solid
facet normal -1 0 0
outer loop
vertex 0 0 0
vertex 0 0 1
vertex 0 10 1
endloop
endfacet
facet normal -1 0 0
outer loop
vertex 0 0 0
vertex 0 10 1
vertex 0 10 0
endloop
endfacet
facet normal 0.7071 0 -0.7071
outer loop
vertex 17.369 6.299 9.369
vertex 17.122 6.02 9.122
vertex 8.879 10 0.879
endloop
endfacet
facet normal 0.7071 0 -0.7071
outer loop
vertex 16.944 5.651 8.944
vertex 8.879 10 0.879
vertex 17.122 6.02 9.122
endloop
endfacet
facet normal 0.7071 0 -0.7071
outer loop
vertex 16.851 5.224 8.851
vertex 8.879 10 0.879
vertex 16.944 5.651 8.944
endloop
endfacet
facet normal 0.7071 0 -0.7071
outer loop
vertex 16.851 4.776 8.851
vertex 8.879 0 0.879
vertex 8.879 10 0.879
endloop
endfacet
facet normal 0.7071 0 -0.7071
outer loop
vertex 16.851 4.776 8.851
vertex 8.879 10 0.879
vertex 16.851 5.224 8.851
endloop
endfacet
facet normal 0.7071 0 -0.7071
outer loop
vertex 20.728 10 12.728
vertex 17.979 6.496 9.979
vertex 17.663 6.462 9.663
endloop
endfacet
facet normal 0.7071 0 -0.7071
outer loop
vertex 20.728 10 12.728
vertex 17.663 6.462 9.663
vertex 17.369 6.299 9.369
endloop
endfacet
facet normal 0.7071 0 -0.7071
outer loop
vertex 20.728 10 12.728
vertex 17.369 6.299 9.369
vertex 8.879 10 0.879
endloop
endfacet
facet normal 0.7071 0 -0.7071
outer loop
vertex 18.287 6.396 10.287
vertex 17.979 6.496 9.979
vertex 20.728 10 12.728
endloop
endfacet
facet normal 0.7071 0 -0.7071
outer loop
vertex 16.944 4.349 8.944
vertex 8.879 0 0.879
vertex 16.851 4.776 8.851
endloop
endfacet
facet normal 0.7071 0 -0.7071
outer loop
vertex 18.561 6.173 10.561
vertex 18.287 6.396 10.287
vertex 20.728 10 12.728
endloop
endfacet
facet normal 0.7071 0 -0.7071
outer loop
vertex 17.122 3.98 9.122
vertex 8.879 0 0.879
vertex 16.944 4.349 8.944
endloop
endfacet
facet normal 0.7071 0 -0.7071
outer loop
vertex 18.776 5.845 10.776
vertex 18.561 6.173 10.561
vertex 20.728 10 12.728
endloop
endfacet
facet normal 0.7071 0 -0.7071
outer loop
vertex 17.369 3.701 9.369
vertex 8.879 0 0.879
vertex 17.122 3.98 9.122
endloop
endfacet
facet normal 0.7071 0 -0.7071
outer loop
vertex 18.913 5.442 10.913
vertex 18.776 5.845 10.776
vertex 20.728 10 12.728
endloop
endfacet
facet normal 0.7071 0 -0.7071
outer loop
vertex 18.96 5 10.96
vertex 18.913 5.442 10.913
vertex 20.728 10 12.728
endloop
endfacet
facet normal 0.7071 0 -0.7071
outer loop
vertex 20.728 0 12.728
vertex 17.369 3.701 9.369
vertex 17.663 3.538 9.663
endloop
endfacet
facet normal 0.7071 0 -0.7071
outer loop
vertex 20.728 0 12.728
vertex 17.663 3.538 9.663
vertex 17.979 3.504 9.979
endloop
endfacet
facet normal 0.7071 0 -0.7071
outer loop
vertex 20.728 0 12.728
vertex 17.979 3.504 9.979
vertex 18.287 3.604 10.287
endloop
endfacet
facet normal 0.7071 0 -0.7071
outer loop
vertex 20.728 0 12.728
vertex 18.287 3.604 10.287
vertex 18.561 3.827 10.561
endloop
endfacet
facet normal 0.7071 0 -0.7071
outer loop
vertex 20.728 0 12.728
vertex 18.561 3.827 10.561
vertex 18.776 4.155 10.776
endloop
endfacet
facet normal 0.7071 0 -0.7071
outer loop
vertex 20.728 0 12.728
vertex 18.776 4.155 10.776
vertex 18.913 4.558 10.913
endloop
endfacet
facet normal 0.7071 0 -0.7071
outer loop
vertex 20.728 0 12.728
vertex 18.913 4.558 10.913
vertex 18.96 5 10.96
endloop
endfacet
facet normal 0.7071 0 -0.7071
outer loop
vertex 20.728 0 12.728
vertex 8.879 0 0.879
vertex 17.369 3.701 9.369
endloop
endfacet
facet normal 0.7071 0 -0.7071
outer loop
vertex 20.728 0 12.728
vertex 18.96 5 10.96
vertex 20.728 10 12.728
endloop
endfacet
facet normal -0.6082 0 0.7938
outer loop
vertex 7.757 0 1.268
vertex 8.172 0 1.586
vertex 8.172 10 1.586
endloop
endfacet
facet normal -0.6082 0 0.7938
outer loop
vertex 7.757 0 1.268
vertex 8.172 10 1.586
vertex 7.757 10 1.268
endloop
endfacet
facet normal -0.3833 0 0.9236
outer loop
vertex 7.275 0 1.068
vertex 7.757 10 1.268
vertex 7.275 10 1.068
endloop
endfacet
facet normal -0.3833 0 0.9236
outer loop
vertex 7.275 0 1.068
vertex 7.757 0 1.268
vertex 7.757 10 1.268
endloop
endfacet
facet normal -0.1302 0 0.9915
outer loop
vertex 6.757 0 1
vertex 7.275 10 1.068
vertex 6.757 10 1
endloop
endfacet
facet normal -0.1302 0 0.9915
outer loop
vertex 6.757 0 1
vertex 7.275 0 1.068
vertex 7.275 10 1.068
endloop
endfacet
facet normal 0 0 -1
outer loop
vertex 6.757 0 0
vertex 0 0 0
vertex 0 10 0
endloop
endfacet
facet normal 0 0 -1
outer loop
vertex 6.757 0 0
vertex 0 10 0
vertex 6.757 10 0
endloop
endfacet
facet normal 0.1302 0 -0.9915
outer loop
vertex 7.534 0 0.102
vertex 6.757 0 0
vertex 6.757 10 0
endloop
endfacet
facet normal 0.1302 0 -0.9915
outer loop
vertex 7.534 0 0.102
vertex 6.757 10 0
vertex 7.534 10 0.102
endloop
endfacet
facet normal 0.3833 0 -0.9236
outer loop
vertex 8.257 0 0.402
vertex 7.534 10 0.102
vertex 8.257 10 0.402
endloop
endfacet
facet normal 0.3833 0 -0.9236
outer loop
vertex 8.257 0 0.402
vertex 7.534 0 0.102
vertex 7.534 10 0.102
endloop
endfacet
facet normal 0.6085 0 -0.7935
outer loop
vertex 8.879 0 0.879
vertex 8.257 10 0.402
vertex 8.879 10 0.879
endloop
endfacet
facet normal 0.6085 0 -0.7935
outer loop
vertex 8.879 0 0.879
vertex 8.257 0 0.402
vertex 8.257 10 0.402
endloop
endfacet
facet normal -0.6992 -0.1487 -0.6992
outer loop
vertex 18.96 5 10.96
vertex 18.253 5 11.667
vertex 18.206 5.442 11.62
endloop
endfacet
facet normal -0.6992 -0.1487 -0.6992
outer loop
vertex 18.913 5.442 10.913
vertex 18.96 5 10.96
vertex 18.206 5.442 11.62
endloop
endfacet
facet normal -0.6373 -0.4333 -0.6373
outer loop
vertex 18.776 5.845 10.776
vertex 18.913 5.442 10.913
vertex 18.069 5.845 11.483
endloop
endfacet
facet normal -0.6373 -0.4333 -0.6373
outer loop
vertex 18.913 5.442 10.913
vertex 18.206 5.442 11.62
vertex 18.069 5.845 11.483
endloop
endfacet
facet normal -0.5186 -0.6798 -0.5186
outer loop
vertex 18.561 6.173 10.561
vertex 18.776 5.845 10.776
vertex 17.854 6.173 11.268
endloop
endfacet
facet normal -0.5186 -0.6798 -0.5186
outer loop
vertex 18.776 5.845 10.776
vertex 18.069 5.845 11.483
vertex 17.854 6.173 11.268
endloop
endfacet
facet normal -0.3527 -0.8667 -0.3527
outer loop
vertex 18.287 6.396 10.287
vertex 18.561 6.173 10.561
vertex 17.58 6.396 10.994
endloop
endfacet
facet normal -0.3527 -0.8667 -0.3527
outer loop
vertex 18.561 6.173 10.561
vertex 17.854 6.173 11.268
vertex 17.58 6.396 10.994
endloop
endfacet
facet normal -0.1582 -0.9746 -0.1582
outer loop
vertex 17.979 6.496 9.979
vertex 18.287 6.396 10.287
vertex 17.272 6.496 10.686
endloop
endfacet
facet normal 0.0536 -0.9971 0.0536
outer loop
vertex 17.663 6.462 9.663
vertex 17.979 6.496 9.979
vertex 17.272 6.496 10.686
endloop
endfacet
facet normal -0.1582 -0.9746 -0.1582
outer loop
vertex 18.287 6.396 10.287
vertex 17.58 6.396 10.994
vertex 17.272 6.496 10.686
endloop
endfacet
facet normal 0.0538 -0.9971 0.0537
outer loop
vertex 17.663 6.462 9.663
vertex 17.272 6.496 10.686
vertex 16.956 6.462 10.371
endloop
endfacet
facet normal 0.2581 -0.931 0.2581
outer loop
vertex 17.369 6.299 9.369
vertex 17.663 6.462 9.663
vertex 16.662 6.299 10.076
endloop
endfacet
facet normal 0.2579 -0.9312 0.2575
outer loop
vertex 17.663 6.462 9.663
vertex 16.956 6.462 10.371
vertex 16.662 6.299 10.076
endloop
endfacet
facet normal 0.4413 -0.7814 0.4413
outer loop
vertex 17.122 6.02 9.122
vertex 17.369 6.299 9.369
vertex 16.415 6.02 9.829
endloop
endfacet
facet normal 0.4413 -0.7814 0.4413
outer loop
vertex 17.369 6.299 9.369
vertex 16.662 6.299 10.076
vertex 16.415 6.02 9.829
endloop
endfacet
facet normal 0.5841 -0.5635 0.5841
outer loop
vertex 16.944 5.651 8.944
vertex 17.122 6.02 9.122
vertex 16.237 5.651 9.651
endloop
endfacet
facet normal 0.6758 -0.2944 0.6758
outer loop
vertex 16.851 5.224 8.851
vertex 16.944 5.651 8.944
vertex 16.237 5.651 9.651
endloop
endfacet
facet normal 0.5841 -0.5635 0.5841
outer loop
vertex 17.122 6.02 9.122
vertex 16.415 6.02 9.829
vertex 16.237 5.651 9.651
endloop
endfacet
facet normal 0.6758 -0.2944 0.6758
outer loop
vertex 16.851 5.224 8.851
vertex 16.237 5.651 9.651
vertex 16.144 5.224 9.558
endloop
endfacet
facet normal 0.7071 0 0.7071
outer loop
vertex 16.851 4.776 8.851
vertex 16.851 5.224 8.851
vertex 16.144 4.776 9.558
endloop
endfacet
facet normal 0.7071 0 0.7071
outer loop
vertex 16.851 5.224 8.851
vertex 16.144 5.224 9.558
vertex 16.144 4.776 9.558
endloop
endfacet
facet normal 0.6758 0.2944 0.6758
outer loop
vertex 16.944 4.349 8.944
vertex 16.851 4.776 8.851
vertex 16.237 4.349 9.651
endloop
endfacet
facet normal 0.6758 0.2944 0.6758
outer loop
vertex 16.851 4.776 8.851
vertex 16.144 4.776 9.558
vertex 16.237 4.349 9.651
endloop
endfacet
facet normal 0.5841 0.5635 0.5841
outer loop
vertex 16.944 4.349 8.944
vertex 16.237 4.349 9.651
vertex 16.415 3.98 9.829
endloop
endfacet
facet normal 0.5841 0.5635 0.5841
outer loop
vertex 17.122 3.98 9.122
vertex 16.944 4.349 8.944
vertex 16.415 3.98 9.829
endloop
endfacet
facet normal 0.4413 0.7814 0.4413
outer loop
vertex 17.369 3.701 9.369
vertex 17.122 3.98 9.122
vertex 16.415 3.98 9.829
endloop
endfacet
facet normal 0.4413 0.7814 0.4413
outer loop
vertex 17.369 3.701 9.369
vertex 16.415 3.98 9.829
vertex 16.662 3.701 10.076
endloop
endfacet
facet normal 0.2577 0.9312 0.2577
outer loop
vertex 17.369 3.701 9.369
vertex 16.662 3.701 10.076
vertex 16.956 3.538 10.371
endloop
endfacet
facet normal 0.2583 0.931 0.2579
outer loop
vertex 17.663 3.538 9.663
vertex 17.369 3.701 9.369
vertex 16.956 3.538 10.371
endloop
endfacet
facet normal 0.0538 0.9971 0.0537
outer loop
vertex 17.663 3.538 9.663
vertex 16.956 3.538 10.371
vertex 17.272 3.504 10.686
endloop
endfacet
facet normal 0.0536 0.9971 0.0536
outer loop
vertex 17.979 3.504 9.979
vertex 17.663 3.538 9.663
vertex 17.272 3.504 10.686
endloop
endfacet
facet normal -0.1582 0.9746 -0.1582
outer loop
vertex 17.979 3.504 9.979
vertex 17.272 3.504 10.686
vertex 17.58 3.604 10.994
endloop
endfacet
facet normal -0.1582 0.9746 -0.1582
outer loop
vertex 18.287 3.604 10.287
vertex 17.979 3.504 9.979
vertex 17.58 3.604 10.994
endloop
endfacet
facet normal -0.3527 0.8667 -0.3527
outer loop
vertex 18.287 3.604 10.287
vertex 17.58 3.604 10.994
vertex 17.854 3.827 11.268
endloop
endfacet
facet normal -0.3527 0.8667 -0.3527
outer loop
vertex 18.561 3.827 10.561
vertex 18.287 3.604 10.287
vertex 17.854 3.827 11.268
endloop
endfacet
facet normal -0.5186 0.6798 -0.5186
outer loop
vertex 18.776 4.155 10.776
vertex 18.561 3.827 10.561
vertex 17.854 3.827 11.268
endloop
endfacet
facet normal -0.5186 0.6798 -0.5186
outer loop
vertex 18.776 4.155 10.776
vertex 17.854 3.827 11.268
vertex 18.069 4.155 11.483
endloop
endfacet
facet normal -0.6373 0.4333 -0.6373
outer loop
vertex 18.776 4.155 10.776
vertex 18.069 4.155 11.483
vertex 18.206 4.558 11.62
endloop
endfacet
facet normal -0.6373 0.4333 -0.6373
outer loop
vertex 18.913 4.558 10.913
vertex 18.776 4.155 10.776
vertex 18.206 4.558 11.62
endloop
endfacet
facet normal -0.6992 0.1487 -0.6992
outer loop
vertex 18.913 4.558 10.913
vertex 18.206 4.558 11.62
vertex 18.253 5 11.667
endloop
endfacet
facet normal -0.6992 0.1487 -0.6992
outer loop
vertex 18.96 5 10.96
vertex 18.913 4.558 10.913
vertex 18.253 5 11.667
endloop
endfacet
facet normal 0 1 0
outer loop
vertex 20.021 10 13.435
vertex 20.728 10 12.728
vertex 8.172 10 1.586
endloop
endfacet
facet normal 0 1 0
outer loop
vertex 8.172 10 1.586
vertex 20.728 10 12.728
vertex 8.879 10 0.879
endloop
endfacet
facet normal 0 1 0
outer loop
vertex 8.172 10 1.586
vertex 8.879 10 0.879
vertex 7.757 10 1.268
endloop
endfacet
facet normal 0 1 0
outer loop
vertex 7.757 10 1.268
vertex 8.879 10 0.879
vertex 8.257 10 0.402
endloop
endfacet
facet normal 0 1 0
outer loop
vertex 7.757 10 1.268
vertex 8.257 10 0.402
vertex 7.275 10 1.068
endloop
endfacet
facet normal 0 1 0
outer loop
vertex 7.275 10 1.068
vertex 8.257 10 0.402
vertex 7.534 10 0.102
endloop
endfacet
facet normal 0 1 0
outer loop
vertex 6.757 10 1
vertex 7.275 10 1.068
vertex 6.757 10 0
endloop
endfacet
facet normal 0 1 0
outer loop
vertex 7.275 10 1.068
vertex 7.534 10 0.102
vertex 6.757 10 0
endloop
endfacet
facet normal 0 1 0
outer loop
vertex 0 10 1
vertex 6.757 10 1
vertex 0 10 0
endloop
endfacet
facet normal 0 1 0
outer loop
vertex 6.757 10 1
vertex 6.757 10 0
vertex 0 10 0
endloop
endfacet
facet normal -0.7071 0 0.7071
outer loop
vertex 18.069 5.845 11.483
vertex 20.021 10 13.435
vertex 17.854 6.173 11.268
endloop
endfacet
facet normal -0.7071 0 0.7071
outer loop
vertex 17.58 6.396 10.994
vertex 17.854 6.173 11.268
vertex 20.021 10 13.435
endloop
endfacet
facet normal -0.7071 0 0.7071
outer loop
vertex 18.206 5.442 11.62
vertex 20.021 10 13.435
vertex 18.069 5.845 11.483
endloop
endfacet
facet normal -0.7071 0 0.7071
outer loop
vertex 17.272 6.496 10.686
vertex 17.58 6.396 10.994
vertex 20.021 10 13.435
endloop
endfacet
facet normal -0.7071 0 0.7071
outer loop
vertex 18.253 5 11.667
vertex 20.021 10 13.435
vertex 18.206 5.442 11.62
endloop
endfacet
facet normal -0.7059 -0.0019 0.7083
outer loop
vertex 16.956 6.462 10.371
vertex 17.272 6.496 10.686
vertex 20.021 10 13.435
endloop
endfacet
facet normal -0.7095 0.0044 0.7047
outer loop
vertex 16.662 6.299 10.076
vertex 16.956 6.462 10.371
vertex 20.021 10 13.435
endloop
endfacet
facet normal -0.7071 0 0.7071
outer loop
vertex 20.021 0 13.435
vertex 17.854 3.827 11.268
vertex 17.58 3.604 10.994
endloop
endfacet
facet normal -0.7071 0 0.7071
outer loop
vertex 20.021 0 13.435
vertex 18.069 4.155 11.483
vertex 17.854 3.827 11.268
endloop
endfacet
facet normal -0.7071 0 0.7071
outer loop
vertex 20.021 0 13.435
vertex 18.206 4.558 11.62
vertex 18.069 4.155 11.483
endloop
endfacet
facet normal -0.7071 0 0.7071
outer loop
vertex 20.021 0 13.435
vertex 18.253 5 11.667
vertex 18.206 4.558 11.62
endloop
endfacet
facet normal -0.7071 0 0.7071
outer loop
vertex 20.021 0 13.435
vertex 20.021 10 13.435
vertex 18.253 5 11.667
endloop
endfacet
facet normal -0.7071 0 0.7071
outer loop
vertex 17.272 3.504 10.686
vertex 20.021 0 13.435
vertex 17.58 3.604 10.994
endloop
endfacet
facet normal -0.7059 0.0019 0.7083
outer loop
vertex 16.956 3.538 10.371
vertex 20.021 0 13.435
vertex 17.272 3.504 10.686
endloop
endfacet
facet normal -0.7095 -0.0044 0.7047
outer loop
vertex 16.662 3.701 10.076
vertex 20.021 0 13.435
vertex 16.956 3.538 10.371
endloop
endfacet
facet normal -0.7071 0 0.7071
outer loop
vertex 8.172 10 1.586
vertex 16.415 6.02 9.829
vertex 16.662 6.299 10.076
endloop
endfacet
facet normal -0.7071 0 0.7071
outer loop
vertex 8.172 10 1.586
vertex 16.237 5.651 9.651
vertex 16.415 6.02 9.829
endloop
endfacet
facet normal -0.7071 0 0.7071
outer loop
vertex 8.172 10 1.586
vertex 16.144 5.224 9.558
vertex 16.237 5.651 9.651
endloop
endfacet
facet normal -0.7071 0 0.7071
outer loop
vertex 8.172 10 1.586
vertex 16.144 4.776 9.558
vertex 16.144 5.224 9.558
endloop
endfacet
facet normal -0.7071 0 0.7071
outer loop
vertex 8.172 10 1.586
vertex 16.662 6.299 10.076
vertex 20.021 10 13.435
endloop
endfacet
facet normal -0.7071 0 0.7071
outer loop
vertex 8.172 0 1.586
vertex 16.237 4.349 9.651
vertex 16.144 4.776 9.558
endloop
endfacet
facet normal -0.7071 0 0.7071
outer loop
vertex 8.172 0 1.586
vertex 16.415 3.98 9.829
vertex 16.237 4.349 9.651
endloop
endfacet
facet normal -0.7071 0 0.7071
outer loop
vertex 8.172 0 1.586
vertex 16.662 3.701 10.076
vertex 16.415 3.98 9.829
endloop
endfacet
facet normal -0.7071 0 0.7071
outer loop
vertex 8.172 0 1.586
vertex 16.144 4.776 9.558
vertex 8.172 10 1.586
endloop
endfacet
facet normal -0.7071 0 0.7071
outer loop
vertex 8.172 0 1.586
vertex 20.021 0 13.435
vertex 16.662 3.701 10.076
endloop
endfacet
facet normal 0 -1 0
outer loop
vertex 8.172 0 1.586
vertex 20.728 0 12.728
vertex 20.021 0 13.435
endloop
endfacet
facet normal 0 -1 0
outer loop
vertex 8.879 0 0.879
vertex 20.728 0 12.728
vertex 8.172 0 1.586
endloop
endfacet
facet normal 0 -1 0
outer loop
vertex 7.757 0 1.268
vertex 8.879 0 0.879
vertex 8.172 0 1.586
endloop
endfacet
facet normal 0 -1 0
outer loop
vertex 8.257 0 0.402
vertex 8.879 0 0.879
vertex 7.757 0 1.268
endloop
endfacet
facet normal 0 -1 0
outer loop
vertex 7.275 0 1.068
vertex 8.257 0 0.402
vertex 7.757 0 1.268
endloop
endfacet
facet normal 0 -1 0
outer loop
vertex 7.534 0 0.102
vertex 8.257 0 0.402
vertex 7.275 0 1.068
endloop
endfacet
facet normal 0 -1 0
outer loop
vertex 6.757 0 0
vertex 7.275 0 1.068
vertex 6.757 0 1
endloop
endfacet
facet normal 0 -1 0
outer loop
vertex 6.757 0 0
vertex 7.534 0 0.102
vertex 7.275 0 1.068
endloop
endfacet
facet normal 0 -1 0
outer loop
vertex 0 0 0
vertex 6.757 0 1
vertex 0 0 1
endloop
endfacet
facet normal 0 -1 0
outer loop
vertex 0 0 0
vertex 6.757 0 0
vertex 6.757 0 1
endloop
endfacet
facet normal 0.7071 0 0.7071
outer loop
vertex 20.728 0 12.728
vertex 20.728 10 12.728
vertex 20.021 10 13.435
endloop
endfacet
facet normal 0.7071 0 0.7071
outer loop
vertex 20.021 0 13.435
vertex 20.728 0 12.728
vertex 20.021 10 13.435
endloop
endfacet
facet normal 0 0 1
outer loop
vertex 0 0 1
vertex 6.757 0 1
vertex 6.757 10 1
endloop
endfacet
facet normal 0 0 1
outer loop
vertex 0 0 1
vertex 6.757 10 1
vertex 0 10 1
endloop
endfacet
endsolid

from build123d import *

# Parameters (mm, degrees)
BASE_FLANGE1_DEPTH = 10
SKETCH4_R          = 1.5
CUT_EXTRUDE1_DEPTH = 27.149638759


# Sheet-metal steps are written as plain solids
with BuildPart() as part:
    # Sketch1 → Base-Flange1 (new body)
    with BuildSketch(Plane(origin=(0, 0, 0), x_dir=(1, 0, 0), z_dir=(0, 1, 0))):
        with BuildLine():
            Line((0, 0), (6.757359313, 0))
            ThreePointArc((6.757359313, 0), (7.90540961, -0.228361402), (8.878679656, -0.878679656))
            Line((8.878679656, -0.878679656), (20.727922061, -12.727922061))
            Line((20.727922061, -12.727922061), (20.02081528, -13.435028843))
            Line((20.02081528, -13.435028843), (8.171572875, -1.585786438))
            ThreePointArc((8.171572875, -1.585786438), (7.522726178, -1.152240935), (6.757359313, -1))
            Line((6.757359313, -1), (0, -1))
            Line((0, -1), (0, 0))
        make_face()
    extrude(amount=BASE_FLANGE1_DEPTH)

    # Sketch4 → Cut-Extrude1 (cut, through all)
    with BuildSketch(Plane(origin=(3.292893219, 0, -3.292893219), x_dir=(0.7071067811865465, 0, 0.7071067811865486), z_dir=(-0.7071067811865486, 0, 0.7071067811865465))):
        with Locations((19.656854249, 5)):
            Circle(SKETCH4_R)
    extrude(amount=-CUT_EXTRUDE1_DEPTH, mode=Mode.SUBTRACT)


solid = part.part
